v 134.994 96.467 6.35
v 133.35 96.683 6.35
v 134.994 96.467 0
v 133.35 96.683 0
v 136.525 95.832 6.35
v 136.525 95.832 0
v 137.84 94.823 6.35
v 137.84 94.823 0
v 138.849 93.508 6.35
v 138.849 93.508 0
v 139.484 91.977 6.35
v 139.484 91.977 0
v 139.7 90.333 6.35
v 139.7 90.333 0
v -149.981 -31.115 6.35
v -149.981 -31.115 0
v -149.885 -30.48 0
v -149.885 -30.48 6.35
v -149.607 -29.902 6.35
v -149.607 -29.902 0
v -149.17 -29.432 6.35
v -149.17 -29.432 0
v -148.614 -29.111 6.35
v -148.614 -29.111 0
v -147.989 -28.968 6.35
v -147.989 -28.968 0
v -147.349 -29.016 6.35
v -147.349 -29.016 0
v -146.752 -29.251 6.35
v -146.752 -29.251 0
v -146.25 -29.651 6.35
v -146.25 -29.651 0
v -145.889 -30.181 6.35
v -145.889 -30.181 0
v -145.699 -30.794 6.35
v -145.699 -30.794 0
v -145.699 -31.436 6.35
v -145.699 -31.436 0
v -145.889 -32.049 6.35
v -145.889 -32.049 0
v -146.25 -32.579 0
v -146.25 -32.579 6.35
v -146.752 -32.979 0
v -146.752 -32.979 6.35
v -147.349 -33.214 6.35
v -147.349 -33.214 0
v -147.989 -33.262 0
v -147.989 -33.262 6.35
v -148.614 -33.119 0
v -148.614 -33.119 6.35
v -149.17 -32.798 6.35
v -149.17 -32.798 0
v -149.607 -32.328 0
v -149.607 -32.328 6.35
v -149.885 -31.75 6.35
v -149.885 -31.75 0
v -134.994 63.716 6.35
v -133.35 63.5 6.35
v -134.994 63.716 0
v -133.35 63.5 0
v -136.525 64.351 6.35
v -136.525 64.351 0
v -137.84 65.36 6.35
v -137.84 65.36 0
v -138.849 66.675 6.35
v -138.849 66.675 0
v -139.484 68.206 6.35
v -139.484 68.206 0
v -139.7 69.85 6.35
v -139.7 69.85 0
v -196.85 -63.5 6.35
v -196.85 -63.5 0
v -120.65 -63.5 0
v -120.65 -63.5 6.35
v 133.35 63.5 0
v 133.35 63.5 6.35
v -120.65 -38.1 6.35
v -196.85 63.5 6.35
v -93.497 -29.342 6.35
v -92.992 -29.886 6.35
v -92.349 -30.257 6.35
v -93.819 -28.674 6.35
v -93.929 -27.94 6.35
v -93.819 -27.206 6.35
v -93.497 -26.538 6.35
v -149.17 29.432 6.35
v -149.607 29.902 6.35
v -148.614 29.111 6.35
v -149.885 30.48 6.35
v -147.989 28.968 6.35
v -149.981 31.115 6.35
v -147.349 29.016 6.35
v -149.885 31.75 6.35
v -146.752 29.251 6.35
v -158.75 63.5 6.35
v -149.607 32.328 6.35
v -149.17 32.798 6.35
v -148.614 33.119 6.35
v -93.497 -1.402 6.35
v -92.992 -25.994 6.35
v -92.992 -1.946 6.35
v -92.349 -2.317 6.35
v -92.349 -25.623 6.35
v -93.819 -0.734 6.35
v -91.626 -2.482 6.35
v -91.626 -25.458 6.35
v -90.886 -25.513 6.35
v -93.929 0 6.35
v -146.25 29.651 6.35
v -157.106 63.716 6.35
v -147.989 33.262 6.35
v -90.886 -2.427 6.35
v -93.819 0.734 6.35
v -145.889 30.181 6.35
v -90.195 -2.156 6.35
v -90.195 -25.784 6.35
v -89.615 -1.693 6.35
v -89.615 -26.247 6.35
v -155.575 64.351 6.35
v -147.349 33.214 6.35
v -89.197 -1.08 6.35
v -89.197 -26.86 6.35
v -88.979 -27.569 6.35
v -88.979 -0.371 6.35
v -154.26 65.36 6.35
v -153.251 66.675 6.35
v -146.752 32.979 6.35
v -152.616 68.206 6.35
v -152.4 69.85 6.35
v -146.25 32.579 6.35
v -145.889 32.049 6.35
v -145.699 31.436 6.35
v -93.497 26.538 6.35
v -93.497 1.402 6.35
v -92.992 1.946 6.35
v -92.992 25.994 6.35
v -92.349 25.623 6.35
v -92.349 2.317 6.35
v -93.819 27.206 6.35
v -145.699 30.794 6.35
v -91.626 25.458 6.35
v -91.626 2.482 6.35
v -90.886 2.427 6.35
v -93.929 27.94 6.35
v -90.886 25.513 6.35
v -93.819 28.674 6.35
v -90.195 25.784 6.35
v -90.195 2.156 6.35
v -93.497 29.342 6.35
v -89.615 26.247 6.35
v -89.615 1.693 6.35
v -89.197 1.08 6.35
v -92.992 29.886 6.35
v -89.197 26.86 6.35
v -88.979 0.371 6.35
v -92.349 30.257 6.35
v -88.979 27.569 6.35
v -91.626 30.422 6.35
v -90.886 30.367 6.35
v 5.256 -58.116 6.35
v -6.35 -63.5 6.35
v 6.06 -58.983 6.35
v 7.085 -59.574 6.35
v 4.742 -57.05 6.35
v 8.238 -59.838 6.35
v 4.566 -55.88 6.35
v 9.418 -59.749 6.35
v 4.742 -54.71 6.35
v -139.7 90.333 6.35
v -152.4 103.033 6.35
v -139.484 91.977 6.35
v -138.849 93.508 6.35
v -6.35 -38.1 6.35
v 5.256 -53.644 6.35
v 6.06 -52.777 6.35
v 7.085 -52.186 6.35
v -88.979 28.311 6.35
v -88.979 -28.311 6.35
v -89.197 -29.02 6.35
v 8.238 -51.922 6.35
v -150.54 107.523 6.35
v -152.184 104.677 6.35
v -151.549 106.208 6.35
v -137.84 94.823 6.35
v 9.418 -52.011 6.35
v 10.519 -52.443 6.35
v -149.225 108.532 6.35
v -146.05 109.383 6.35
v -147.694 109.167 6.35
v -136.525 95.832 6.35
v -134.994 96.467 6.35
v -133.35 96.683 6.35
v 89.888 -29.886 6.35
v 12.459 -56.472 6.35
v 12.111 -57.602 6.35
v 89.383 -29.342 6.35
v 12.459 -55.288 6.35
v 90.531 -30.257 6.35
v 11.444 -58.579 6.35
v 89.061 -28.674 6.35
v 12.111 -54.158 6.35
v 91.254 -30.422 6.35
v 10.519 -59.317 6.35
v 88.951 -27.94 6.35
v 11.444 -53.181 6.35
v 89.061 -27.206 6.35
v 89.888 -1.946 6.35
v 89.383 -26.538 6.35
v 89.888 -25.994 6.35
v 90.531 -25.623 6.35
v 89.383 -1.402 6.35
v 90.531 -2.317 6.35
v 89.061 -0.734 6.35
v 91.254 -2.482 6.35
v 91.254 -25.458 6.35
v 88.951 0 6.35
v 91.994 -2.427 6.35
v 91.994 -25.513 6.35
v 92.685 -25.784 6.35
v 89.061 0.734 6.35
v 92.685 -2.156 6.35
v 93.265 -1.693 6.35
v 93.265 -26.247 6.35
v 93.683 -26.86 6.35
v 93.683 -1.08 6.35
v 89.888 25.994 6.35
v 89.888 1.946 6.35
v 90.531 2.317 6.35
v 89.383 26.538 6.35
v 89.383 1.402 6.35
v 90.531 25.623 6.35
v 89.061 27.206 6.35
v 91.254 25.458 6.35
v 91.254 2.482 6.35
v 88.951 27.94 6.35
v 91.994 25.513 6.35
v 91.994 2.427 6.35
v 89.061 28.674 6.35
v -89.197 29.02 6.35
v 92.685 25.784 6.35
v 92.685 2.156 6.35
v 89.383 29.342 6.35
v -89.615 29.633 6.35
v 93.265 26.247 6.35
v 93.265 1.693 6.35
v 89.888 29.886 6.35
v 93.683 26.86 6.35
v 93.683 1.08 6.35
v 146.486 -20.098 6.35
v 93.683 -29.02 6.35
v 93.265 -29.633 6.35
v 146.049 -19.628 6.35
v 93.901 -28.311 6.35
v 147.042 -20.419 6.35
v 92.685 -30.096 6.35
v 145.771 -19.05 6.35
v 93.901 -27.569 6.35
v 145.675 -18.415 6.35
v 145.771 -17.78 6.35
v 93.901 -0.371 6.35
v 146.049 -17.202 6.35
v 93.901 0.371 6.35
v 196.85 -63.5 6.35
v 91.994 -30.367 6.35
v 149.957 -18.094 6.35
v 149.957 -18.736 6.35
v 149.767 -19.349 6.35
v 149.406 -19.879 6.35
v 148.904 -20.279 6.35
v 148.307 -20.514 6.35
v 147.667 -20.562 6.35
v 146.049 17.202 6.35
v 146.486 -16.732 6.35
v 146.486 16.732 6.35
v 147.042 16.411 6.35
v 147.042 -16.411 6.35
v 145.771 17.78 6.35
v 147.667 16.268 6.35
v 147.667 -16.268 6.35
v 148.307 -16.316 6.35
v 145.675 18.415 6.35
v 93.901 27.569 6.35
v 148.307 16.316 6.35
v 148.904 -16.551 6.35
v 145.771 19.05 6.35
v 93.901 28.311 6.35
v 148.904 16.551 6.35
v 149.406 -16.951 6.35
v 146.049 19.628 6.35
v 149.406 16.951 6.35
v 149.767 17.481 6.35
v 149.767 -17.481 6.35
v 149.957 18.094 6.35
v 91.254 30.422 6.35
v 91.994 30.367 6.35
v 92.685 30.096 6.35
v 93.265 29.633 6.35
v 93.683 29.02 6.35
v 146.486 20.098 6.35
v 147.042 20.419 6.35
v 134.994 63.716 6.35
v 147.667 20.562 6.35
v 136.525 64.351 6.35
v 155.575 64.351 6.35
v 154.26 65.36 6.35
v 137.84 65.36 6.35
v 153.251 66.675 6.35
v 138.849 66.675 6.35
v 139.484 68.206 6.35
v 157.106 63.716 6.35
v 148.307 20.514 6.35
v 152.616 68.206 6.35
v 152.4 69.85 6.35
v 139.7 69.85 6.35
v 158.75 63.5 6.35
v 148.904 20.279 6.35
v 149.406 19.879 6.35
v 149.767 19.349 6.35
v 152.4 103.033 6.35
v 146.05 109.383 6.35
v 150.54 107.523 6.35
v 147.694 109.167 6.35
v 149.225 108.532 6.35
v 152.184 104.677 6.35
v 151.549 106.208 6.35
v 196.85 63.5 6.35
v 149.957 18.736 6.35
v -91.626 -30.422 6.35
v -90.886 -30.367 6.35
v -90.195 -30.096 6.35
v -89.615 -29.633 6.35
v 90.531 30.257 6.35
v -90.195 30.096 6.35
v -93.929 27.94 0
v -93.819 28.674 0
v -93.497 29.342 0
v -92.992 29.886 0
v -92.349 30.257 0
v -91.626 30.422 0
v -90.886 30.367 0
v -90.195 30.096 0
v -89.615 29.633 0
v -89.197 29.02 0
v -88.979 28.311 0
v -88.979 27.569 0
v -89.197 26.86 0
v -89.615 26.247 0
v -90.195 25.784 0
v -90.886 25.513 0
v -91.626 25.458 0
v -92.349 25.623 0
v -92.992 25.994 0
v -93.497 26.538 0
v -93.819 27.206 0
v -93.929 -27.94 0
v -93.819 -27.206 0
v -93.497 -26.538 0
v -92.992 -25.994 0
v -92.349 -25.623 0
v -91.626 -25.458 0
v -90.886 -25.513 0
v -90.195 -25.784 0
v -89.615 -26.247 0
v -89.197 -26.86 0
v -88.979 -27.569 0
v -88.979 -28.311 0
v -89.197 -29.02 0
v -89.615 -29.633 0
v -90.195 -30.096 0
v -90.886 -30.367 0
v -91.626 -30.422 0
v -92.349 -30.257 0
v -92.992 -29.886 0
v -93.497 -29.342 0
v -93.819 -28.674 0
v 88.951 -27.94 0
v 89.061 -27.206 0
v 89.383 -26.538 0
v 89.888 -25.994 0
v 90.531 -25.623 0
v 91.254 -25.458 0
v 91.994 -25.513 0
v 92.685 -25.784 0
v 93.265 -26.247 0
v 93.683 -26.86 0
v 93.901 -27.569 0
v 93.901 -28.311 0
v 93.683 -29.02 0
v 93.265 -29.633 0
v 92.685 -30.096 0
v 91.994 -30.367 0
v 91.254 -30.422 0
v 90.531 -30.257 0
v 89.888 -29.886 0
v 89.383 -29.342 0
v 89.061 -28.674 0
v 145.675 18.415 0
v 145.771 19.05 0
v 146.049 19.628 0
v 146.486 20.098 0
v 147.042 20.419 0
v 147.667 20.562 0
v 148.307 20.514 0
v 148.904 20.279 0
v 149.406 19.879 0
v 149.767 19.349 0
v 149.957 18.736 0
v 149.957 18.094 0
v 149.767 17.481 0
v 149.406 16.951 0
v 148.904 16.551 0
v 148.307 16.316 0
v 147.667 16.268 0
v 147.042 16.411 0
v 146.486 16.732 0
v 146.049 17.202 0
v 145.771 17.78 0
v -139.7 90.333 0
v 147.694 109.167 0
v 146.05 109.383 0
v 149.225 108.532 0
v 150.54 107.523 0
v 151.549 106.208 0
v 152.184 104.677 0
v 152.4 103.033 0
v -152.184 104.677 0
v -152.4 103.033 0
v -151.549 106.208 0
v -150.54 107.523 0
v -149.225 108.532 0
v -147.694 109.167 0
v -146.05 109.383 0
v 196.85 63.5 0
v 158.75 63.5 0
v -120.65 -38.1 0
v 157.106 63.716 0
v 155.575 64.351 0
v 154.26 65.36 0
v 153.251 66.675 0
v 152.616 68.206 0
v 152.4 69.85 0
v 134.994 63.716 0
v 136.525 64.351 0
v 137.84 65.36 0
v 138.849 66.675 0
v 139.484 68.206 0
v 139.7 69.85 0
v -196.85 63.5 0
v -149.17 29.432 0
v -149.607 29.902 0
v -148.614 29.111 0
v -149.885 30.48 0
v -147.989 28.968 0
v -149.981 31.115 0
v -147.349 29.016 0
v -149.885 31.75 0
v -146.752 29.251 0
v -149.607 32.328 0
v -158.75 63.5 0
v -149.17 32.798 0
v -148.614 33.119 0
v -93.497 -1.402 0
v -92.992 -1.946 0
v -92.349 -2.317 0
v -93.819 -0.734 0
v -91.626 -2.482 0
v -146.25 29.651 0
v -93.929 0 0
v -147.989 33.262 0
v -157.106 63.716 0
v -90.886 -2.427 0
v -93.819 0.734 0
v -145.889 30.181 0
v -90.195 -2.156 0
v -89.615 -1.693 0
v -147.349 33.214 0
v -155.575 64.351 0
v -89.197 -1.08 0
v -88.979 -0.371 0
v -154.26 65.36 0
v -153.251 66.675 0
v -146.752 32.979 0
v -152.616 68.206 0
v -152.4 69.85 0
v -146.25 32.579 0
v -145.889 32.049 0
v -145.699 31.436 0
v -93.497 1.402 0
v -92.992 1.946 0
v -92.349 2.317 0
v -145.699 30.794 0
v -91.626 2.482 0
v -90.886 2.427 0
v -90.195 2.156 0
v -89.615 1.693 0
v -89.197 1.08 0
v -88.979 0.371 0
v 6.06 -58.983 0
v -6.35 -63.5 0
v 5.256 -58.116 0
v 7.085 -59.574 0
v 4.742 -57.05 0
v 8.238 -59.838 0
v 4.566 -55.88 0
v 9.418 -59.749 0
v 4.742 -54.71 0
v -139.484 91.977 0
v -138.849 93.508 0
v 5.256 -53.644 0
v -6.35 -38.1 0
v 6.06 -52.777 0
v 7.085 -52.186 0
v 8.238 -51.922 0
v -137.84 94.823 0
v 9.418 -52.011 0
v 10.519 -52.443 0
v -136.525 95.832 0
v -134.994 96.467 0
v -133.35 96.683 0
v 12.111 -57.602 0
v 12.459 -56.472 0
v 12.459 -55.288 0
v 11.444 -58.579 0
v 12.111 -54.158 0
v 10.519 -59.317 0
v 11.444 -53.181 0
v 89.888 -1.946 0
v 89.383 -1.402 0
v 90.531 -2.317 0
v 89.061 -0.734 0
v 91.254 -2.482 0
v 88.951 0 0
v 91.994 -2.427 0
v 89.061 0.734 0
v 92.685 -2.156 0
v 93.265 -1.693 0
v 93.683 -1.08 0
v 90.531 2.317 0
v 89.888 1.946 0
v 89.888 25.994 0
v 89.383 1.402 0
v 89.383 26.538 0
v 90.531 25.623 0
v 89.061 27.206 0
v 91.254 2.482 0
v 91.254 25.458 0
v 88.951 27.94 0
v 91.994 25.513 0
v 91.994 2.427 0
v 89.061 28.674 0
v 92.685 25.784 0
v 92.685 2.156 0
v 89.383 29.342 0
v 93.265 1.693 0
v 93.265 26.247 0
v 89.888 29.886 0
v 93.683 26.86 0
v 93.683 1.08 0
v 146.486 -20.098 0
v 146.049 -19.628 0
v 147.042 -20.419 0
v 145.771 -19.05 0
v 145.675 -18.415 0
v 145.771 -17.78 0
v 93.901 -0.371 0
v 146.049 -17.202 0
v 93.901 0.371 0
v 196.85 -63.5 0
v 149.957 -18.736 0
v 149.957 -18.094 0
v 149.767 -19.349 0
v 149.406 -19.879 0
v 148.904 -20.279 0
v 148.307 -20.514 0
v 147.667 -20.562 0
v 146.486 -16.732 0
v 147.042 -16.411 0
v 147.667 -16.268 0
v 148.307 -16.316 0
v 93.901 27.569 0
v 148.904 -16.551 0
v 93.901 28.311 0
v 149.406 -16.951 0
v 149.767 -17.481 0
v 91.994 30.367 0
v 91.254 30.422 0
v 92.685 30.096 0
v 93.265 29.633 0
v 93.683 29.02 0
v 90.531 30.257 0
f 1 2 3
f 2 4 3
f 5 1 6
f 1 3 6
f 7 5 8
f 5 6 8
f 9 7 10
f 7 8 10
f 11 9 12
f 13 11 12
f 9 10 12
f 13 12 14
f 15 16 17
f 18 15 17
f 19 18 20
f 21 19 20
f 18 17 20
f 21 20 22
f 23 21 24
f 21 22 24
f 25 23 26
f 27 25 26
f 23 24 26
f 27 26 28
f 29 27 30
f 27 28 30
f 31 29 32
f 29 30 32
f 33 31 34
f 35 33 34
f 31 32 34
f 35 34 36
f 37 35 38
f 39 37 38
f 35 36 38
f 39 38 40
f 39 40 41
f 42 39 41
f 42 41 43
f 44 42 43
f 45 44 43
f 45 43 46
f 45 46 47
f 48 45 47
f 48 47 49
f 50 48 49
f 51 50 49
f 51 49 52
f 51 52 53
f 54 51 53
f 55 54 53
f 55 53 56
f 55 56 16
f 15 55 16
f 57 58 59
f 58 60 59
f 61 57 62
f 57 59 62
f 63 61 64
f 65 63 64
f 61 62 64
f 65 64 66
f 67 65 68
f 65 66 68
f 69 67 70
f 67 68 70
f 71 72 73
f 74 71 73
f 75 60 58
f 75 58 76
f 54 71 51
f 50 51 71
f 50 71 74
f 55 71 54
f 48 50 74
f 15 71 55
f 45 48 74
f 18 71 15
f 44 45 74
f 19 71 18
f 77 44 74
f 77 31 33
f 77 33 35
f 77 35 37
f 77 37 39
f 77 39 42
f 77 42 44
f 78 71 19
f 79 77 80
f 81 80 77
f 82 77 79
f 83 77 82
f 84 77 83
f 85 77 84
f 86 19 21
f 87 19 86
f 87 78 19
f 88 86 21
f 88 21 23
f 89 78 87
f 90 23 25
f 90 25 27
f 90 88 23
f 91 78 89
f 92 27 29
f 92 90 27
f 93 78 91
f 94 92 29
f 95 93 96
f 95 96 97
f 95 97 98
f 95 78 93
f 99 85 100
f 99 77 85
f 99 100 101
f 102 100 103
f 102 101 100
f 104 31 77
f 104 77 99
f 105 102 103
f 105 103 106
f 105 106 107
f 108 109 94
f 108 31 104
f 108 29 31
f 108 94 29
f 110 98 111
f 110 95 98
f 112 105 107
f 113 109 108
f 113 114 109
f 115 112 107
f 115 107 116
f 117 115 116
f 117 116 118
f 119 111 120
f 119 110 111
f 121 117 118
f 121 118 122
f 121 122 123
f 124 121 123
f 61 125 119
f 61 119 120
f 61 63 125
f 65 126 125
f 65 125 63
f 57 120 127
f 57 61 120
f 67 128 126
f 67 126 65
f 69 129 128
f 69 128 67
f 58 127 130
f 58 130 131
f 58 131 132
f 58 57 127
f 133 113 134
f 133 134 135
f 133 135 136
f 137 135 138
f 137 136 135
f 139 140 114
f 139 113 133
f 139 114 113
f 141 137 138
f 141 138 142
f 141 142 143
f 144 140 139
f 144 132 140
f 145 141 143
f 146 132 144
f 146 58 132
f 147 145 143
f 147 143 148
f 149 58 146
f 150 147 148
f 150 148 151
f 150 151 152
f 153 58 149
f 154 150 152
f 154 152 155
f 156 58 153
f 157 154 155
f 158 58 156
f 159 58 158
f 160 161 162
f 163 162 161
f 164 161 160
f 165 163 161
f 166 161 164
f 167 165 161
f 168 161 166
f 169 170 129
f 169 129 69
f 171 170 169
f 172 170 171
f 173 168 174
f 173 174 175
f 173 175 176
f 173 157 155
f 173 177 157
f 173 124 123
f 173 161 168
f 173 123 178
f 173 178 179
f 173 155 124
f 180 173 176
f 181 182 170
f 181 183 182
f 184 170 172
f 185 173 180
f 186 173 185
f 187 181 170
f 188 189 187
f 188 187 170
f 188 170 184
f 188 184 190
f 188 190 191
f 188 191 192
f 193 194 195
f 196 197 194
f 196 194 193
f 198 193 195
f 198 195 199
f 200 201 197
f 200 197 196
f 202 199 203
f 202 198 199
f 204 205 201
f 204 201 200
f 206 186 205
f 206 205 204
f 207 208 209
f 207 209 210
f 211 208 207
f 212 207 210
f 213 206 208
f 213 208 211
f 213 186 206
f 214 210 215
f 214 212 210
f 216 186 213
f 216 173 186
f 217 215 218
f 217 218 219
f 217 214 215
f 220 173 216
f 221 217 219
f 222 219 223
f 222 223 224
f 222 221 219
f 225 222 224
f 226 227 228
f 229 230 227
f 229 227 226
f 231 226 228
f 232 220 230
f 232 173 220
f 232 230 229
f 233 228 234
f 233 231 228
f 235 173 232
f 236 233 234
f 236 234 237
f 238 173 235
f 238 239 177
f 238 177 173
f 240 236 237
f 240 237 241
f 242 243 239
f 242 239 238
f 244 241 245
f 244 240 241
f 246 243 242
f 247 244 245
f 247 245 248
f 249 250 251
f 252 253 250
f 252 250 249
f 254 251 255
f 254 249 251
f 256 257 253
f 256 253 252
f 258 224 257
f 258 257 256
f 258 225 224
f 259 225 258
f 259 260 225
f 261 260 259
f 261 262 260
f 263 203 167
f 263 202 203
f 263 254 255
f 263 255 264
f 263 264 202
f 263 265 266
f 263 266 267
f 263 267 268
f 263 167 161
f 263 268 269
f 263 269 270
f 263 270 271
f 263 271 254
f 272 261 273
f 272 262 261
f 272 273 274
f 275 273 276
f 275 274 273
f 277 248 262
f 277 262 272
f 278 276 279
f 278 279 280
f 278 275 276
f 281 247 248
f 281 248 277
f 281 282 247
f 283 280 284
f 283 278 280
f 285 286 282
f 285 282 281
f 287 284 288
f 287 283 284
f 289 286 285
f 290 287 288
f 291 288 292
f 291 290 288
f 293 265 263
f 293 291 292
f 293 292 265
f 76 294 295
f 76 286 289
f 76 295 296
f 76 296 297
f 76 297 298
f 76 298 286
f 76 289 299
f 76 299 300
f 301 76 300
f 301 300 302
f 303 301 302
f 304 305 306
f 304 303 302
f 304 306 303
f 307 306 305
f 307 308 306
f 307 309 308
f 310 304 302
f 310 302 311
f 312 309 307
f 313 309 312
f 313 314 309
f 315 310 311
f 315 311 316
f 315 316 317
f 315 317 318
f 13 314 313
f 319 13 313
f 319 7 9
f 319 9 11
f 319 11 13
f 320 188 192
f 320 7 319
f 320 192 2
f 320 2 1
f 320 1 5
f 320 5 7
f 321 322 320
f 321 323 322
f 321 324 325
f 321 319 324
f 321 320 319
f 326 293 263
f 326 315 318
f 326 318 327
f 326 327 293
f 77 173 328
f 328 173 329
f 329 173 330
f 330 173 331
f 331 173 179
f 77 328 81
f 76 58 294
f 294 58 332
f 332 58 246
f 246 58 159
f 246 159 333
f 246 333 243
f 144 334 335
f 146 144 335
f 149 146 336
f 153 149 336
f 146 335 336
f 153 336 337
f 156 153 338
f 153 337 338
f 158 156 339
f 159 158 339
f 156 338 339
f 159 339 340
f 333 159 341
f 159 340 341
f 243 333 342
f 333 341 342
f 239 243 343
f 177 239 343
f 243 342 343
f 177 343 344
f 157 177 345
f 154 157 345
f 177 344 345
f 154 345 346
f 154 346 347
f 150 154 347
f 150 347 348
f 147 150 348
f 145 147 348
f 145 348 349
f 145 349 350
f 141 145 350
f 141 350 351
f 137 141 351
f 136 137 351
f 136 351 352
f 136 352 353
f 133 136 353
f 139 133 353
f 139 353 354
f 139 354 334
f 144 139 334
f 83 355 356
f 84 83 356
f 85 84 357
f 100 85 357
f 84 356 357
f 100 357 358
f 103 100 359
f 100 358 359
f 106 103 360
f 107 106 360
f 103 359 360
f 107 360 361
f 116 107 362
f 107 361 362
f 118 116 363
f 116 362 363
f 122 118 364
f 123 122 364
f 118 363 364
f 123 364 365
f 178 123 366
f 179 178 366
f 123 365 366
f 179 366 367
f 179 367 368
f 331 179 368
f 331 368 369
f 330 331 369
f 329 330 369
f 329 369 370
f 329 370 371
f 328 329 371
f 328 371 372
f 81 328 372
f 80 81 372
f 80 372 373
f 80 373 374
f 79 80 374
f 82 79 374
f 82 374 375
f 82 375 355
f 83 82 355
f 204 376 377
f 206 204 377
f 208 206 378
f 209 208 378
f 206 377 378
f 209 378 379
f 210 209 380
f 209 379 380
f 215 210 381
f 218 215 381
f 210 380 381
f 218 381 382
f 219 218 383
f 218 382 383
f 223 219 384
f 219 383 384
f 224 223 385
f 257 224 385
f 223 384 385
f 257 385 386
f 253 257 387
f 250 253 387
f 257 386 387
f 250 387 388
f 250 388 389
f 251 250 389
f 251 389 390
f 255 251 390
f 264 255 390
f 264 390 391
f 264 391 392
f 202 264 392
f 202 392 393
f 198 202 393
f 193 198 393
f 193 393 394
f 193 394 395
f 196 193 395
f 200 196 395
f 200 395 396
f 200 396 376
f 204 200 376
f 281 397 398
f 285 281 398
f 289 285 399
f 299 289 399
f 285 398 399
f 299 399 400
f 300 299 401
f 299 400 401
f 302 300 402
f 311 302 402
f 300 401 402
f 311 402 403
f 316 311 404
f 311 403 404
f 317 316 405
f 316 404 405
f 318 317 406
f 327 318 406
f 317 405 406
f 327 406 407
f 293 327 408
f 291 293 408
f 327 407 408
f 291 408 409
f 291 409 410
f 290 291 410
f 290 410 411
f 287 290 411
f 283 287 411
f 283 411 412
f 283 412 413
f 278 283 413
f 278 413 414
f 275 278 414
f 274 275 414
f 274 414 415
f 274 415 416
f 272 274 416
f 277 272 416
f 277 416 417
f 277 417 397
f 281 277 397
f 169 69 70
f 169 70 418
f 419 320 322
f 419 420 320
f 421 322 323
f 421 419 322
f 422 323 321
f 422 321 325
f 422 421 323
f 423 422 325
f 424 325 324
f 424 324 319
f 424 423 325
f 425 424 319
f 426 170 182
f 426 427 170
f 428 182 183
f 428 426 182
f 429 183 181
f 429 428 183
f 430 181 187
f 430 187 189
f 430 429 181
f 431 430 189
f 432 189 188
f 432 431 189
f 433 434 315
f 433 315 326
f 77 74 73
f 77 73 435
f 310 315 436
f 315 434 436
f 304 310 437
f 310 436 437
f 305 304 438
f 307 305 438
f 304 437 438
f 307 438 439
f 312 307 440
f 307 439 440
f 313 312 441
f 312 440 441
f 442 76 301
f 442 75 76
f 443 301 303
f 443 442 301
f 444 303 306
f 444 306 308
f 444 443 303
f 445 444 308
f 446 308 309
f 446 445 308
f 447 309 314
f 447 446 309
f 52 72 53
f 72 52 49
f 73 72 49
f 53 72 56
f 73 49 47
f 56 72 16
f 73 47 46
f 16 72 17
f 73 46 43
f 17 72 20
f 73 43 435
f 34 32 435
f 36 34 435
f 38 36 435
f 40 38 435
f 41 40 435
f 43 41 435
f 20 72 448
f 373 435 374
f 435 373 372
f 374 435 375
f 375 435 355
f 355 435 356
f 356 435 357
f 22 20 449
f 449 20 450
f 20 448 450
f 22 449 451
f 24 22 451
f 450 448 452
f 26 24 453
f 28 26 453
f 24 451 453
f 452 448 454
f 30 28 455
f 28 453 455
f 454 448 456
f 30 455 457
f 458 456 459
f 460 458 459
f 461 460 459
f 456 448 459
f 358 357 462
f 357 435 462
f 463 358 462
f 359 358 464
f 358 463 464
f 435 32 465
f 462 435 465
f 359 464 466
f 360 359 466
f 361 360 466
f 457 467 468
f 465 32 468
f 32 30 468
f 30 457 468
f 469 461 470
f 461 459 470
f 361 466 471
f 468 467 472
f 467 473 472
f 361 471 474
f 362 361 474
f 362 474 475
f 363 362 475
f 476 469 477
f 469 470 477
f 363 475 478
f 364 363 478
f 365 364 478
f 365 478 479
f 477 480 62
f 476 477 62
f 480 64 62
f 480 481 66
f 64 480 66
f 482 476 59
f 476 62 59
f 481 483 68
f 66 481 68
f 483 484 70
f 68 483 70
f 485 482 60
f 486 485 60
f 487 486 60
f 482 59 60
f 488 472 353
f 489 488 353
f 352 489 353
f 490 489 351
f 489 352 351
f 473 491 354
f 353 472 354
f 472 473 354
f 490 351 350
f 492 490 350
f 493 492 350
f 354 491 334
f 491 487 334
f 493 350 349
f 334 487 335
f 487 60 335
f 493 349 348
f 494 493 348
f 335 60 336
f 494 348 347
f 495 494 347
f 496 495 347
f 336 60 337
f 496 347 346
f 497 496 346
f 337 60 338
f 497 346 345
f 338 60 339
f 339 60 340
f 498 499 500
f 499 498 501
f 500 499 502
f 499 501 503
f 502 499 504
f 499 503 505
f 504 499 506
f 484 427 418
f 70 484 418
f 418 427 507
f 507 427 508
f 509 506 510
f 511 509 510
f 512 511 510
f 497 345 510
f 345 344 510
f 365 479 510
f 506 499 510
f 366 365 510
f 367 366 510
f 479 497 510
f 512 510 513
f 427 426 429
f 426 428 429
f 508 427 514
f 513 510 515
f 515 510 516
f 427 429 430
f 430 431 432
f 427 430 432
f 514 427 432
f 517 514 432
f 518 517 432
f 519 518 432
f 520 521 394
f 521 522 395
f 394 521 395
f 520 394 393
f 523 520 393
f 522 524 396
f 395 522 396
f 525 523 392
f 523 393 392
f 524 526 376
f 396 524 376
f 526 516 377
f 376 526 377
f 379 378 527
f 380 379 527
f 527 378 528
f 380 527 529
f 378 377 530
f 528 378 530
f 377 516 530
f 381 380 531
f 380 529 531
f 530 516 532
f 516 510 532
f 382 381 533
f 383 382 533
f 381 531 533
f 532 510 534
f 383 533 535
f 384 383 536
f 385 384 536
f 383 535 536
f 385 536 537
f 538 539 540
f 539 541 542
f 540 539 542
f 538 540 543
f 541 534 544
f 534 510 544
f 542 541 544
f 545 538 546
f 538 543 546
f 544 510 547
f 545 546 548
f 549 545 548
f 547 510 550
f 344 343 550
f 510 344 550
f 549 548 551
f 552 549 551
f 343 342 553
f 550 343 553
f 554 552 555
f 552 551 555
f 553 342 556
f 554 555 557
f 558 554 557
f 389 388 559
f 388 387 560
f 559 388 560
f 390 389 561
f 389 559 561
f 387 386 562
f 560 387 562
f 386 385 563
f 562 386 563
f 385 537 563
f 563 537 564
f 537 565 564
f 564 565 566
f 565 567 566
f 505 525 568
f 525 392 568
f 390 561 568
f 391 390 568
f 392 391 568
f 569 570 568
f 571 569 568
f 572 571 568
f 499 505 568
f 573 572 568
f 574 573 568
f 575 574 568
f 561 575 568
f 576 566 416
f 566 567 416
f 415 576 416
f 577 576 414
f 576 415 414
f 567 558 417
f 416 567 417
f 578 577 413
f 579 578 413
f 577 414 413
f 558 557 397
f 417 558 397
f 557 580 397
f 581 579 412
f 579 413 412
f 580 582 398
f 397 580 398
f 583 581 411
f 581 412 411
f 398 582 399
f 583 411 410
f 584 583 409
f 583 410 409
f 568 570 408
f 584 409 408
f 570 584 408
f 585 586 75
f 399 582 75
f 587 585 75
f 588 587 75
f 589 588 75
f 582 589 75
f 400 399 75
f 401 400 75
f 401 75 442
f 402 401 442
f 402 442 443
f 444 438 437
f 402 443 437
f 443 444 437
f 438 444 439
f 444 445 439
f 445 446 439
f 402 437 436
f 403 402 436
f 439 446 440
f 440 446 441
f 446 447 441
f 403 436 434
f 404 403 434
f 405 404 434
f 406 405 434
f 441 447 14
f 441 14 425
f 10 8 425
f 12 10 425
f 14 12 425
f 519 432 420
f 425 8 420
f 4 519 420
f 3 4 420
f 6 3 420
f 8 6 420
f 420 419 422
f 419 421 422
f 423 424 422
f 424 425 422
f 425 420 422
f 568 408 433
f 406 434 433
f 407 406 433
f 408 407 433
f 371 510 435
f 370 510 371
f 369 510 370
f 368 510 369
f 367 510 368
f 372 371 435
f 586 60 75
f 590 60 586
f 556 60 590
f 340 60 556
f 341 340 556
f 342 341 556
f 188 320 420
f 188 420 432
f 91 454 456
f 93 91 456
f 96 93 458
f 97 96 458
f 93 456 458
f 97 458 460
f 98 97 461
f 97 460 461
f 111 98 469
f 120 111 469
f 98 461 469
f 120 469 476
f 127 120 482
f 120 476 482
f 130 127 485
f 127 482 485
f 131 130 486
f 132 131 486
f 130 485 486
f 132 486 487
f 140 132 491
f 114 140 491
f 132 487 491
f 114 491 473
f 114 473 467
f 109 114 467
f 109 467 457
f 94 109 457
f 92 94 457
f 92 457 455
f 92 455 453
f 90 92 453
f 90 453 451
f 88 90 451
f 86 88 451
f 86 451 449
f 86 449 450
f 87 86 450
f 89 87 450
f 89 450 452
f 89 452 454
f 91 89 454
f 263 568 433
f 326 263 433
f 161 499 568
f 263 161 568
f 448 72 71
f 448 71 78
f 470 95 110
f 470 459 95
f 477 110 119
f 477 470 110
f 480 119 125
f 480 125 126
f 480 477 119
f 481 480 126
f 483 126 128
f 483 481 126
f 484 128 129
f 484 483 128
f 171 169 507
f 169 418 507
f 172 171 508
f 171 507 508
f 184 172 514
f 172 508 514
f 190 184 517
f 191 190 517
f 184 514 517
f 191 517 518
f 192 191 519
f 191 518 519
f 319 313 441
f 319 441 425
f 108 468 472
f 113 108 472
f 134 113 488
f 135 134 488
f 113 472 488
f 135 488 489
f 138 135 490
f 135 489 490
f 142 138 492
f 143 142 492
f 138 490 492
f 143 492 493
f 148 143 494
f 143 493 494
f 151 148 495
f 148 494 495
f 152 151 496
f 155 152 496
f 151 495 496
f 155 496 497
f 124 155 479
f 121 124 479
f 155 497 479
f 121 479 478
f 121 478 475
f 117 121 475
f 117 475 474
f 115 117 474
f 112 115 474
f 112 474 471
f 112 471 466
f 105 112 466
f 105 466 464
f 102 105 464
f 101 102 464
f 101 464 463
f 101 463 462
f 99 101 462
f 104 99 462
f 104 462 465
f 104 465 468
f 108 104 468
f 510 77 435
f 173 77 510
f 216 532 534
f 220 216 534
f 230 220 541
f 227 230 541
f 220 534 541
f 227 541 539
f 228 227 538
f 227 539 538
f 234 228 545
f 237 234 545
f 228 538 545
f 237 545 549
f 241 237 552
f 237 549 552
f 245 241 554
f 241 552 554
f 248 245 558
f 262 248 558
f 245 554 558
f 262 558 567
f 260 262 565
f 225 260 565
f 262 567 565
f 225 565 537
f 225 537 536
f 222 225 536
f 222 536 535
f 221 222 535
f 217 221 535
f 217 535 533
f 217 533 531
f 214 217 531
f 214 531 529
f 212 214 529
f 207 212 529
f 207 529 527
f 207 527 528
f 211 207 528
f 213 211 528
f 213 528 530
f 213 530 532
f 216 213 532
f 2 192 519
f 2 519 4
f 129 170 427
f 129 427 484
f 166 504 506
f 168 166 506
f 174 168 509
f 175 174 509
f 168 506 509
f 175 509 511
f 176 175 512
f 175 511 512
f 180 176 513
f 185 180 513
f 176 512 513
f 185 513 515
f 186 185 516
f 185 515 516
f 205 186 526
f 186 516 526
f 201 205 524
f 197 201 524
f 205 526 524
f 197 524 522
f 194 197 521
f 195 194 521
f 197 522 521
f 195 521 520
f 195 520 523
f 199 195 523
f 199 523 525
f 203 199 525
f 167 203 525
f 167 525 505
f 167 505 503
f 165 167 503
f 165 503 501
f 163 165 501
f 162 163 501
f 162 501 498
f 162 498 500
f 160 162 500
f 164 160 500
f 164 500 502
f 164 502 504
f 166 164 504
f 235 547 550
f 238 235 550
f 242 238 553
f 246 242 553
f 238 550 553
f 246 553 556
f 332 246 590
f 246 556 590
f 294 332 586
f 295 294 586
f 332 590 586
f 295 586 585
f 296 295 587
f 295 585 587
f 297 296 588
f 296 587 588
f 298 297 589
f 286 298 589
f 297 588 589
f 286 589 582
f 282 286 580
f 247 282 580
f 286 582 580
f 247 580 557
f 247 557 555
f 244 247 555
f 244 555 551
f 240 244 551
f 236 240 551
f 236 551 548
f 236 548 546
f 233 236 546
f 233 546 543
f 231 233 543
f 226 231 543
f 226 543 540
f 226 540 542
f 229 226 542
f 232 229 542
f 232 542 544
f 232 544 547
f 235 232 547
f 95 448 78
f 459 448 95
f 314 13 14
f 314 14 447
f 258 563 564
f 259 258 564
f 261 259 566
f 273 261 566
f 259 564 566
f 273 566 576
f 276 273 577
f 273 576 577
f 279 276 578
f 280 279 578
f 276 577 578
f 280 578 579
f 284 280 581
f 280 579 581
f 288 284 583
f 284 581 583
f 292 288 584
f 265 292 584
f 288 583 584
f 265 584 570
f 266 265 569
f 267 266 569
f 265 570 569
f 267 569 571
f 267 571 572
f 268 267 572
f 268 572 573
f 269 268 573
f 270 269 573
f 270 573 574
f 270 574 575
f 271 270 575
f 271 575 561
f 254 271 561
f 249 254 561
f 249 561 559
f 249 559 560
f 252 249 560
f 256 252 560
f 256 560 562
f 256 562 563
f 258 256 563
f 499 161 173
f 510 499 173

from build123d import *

# Parameters (mm, degrees)
SKETCH1_W                      = 393.7
SKETCH1_H                      = 127
BOSS_EXTRUDE1_DEPTH            = 6.35
F_10_CLEARANCE_HOLE1_D         = 4.9784
BOSS_EXTRUDE2_DEPTH            = 6.35
FILLET1_R                      = 6.35
F_8_CLEARANCE_HOLE1_D          = 4.3053
SKETCH11_W                     = 114.3
SKETCH11_H                     = 25.4
CUT_EXTRUDE1_DEPTH             = 226.28847424
F_5_16_0_3125_DIAMETER_HOLE1_D = 7.9375


with BuildPart() as part:
    # Sketch1 → Boss-Extrude1 (new body)
    with BuildSketch(Plane.XY):
        Rectangle(SKETCH1_W, SKETCH1_H)
    extrude(amount=BOSS_EXTRUDE1_DEPTH)

    # #10 Clearance Hole1 (through all)
    with Locations(Plane.XY.offset(6.35)):
        with Locations((-91.44, 27.94), (-91.44, -27.94), (91.44, 27.94), (91.44, -27.94), (-91.44, 0), (91.44, 0)):
            Hole(F_10_CLEARANCE_HOLE1_D / 2)

    # Sketch10 → Boss-Extrude2 (add)
    with BuildSketch(Plane.XY.offset(6.35)):
        Polygon((-152.4, 63.5), (-139.7, 63.5), (-139.7, 96.68304999), (139.7, 96.68304999), (139.7, 63.5), (152.4, 63.5), (152.4, 109.38304999), (-152.4, 109.38304999), align=None)
    extrude(amount=-BOSS_EXTRUDE2_DEPTH)

    # Fillet1
    fillet1_edges = [part.edges().sort_by_distance(p)[0] for p in [
        (152.4, 109.38304999, 3.175),
        (-152.4, 109.38304999, 3.175),
        (-152.4, 63.5, 3.175),
        (152.4, 63.5, 3.175),
        (139.7, 96.68304999, 3.175),
        (139.7, 63.5, 3.175),
        (-139.7, 63.5, 3.175),
        (-139.7, 96.68304999, 3.175),
    ]]
    fillet(fillet1_edges, radius=FILLET1_R)

    # #8 Clearance Hole1 (through all)
    with Locations(Plane.XY.offset(6.35)):
        with Locations((-147.828, 31.115), (-147.828, -31.115), (147.828, 18.415), (147.828, -18.415)):
            Hole(F_8_CLEARANCE_HOLE1_D / 2)

    # Sketch11 → Cut-Extrude1 (cut, through all)
    with BuildSketch(Plane.XY.offset(6.35)):
        with Locations((-63.5, -50.8)):
            Rectangle(SKETCH11_W, SKETCH11_H)
    extrude(amount=-CUT_EXTRUDE1_DEPTH, mode=Mode.SUBTRACT)

    # 5/16 (0.3125) Diameter Hole1 (through all)
    with Locations(Plane.XY.offset(6.35)):
        with Locations((8.534908, -55.88)):
            Hole(F_5_16_0_3125_DIAMETER_HOLE1_D / 2)


solid = part.part
